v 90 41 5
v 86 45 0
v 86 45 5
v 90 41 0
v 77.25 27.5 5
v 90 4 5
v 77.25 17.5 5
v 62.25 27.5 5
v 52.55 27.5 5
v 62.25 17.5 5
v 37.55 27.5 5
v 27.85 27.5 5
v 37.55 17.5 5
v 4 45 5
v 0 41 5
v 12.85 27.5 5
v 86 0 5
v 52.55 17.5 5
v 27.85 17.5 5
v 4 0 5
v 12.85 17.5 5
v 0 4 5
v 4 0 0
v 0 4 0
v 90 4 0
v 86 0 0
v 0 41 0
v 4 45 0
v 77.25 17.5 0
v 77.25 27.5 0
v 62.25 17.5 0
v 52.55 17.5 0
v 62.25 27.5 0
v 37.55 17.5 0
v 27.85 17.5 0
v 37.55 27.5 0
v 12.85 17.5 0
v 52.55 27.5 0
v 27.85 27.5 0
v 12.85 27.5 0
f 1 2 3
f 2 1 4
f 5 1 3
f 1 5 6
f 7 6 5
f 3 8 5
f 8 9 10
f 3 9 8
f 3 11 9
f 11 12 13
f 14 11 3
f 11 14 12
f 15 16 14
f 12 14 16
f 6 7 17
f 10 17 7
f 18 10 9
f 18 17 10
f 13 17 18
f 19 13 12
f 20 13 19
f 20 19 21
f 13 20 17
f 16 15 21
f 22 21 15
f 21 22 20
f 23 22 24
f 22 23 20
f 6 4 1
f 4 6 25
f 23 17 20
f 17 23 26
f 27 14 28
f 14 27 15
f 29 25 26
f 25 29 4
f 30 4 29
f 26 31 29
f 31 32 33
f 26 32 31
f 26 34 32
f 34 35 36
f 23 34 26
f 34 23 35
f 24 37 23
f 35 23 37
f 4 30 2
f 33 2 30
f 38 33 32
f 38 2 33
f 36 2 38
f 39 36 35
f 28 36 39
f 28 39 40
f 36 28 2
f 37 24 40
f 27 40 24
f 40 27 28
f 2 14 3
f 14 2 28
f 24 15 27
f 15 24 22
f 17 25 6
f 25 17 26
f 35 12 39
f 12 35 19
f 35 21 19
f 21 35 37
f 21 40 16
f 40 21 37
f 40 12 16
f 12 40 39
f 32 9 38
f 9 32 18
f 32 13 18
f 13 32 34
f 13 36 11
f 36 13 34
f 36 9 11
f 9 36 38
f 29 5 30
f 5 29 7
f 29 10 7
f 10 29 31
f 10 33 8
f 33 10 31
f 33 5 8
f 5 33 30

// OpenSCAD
$fn = 32;

// ----------------------------------------------------------------------
// Windowed plate: 3 voids, 90 x 45 x 5 mm
// ----------------------------------------------------------------------

// --- parameters (mm) ---
plate_l = 90;             // plate length, X
plate_w = 45;             // plate width, Y
plate_t = 5;              // plate thickness, Z
edge_margin = 8;          // wall from the plate edge to any window
windows = 3;              // number of windows in the row
win_l = 15;               // window length
win_w = 10;               // window width
win_pitch = 24.7;         // window pitch along X
depth_1 = 5;              // depth of void 1 (full thickness = through)
depth_2 = 5;              // depth of void 2 (full thickness = through)
depth_3 = 5;              // depth of void 3 (full thickness = through)
corner_c = 4;             // corner chamfer of the plate

profile = [[4, 0], [86, 0], [90, 4], [90, 41], [86, 45], [4, 45], [0, 41], [0, 4]];  // primary outline, 8 points, counter clockwise
void_1 = [[12.85, 17.5], [27.85, 17.5], [27.85, 27.5], [12.85, 27.5]];  // window 1 of the row, 4 points
void_2 = [[37.55, 17.5], [52.55, 17.5], [52.55, 27.5], [37.55, 27.5]];  // window 2 of the row, 4 points
void_3 = [[62.25, 17.5], [77.25, 17.5], [77.25, 27.5], [62.25, 27.5]];  // window 3 of the row, 4 points

// --- the one profile operation ---
difference() {
  linear_extrude(height = plate_t) polygon(points = profile);
  translate([0, 0, -1])
    linear_extrude(height = plate_t + 2) polygon(points = void_1);
  translate([0, 0, -1])
    linear_extrude(height = plate_t + 2) polygon(points = void_2);
  translate([0, 0, -1])
    linear_extrude(height = plate_t + 2) polygon(points = void_3);
}
